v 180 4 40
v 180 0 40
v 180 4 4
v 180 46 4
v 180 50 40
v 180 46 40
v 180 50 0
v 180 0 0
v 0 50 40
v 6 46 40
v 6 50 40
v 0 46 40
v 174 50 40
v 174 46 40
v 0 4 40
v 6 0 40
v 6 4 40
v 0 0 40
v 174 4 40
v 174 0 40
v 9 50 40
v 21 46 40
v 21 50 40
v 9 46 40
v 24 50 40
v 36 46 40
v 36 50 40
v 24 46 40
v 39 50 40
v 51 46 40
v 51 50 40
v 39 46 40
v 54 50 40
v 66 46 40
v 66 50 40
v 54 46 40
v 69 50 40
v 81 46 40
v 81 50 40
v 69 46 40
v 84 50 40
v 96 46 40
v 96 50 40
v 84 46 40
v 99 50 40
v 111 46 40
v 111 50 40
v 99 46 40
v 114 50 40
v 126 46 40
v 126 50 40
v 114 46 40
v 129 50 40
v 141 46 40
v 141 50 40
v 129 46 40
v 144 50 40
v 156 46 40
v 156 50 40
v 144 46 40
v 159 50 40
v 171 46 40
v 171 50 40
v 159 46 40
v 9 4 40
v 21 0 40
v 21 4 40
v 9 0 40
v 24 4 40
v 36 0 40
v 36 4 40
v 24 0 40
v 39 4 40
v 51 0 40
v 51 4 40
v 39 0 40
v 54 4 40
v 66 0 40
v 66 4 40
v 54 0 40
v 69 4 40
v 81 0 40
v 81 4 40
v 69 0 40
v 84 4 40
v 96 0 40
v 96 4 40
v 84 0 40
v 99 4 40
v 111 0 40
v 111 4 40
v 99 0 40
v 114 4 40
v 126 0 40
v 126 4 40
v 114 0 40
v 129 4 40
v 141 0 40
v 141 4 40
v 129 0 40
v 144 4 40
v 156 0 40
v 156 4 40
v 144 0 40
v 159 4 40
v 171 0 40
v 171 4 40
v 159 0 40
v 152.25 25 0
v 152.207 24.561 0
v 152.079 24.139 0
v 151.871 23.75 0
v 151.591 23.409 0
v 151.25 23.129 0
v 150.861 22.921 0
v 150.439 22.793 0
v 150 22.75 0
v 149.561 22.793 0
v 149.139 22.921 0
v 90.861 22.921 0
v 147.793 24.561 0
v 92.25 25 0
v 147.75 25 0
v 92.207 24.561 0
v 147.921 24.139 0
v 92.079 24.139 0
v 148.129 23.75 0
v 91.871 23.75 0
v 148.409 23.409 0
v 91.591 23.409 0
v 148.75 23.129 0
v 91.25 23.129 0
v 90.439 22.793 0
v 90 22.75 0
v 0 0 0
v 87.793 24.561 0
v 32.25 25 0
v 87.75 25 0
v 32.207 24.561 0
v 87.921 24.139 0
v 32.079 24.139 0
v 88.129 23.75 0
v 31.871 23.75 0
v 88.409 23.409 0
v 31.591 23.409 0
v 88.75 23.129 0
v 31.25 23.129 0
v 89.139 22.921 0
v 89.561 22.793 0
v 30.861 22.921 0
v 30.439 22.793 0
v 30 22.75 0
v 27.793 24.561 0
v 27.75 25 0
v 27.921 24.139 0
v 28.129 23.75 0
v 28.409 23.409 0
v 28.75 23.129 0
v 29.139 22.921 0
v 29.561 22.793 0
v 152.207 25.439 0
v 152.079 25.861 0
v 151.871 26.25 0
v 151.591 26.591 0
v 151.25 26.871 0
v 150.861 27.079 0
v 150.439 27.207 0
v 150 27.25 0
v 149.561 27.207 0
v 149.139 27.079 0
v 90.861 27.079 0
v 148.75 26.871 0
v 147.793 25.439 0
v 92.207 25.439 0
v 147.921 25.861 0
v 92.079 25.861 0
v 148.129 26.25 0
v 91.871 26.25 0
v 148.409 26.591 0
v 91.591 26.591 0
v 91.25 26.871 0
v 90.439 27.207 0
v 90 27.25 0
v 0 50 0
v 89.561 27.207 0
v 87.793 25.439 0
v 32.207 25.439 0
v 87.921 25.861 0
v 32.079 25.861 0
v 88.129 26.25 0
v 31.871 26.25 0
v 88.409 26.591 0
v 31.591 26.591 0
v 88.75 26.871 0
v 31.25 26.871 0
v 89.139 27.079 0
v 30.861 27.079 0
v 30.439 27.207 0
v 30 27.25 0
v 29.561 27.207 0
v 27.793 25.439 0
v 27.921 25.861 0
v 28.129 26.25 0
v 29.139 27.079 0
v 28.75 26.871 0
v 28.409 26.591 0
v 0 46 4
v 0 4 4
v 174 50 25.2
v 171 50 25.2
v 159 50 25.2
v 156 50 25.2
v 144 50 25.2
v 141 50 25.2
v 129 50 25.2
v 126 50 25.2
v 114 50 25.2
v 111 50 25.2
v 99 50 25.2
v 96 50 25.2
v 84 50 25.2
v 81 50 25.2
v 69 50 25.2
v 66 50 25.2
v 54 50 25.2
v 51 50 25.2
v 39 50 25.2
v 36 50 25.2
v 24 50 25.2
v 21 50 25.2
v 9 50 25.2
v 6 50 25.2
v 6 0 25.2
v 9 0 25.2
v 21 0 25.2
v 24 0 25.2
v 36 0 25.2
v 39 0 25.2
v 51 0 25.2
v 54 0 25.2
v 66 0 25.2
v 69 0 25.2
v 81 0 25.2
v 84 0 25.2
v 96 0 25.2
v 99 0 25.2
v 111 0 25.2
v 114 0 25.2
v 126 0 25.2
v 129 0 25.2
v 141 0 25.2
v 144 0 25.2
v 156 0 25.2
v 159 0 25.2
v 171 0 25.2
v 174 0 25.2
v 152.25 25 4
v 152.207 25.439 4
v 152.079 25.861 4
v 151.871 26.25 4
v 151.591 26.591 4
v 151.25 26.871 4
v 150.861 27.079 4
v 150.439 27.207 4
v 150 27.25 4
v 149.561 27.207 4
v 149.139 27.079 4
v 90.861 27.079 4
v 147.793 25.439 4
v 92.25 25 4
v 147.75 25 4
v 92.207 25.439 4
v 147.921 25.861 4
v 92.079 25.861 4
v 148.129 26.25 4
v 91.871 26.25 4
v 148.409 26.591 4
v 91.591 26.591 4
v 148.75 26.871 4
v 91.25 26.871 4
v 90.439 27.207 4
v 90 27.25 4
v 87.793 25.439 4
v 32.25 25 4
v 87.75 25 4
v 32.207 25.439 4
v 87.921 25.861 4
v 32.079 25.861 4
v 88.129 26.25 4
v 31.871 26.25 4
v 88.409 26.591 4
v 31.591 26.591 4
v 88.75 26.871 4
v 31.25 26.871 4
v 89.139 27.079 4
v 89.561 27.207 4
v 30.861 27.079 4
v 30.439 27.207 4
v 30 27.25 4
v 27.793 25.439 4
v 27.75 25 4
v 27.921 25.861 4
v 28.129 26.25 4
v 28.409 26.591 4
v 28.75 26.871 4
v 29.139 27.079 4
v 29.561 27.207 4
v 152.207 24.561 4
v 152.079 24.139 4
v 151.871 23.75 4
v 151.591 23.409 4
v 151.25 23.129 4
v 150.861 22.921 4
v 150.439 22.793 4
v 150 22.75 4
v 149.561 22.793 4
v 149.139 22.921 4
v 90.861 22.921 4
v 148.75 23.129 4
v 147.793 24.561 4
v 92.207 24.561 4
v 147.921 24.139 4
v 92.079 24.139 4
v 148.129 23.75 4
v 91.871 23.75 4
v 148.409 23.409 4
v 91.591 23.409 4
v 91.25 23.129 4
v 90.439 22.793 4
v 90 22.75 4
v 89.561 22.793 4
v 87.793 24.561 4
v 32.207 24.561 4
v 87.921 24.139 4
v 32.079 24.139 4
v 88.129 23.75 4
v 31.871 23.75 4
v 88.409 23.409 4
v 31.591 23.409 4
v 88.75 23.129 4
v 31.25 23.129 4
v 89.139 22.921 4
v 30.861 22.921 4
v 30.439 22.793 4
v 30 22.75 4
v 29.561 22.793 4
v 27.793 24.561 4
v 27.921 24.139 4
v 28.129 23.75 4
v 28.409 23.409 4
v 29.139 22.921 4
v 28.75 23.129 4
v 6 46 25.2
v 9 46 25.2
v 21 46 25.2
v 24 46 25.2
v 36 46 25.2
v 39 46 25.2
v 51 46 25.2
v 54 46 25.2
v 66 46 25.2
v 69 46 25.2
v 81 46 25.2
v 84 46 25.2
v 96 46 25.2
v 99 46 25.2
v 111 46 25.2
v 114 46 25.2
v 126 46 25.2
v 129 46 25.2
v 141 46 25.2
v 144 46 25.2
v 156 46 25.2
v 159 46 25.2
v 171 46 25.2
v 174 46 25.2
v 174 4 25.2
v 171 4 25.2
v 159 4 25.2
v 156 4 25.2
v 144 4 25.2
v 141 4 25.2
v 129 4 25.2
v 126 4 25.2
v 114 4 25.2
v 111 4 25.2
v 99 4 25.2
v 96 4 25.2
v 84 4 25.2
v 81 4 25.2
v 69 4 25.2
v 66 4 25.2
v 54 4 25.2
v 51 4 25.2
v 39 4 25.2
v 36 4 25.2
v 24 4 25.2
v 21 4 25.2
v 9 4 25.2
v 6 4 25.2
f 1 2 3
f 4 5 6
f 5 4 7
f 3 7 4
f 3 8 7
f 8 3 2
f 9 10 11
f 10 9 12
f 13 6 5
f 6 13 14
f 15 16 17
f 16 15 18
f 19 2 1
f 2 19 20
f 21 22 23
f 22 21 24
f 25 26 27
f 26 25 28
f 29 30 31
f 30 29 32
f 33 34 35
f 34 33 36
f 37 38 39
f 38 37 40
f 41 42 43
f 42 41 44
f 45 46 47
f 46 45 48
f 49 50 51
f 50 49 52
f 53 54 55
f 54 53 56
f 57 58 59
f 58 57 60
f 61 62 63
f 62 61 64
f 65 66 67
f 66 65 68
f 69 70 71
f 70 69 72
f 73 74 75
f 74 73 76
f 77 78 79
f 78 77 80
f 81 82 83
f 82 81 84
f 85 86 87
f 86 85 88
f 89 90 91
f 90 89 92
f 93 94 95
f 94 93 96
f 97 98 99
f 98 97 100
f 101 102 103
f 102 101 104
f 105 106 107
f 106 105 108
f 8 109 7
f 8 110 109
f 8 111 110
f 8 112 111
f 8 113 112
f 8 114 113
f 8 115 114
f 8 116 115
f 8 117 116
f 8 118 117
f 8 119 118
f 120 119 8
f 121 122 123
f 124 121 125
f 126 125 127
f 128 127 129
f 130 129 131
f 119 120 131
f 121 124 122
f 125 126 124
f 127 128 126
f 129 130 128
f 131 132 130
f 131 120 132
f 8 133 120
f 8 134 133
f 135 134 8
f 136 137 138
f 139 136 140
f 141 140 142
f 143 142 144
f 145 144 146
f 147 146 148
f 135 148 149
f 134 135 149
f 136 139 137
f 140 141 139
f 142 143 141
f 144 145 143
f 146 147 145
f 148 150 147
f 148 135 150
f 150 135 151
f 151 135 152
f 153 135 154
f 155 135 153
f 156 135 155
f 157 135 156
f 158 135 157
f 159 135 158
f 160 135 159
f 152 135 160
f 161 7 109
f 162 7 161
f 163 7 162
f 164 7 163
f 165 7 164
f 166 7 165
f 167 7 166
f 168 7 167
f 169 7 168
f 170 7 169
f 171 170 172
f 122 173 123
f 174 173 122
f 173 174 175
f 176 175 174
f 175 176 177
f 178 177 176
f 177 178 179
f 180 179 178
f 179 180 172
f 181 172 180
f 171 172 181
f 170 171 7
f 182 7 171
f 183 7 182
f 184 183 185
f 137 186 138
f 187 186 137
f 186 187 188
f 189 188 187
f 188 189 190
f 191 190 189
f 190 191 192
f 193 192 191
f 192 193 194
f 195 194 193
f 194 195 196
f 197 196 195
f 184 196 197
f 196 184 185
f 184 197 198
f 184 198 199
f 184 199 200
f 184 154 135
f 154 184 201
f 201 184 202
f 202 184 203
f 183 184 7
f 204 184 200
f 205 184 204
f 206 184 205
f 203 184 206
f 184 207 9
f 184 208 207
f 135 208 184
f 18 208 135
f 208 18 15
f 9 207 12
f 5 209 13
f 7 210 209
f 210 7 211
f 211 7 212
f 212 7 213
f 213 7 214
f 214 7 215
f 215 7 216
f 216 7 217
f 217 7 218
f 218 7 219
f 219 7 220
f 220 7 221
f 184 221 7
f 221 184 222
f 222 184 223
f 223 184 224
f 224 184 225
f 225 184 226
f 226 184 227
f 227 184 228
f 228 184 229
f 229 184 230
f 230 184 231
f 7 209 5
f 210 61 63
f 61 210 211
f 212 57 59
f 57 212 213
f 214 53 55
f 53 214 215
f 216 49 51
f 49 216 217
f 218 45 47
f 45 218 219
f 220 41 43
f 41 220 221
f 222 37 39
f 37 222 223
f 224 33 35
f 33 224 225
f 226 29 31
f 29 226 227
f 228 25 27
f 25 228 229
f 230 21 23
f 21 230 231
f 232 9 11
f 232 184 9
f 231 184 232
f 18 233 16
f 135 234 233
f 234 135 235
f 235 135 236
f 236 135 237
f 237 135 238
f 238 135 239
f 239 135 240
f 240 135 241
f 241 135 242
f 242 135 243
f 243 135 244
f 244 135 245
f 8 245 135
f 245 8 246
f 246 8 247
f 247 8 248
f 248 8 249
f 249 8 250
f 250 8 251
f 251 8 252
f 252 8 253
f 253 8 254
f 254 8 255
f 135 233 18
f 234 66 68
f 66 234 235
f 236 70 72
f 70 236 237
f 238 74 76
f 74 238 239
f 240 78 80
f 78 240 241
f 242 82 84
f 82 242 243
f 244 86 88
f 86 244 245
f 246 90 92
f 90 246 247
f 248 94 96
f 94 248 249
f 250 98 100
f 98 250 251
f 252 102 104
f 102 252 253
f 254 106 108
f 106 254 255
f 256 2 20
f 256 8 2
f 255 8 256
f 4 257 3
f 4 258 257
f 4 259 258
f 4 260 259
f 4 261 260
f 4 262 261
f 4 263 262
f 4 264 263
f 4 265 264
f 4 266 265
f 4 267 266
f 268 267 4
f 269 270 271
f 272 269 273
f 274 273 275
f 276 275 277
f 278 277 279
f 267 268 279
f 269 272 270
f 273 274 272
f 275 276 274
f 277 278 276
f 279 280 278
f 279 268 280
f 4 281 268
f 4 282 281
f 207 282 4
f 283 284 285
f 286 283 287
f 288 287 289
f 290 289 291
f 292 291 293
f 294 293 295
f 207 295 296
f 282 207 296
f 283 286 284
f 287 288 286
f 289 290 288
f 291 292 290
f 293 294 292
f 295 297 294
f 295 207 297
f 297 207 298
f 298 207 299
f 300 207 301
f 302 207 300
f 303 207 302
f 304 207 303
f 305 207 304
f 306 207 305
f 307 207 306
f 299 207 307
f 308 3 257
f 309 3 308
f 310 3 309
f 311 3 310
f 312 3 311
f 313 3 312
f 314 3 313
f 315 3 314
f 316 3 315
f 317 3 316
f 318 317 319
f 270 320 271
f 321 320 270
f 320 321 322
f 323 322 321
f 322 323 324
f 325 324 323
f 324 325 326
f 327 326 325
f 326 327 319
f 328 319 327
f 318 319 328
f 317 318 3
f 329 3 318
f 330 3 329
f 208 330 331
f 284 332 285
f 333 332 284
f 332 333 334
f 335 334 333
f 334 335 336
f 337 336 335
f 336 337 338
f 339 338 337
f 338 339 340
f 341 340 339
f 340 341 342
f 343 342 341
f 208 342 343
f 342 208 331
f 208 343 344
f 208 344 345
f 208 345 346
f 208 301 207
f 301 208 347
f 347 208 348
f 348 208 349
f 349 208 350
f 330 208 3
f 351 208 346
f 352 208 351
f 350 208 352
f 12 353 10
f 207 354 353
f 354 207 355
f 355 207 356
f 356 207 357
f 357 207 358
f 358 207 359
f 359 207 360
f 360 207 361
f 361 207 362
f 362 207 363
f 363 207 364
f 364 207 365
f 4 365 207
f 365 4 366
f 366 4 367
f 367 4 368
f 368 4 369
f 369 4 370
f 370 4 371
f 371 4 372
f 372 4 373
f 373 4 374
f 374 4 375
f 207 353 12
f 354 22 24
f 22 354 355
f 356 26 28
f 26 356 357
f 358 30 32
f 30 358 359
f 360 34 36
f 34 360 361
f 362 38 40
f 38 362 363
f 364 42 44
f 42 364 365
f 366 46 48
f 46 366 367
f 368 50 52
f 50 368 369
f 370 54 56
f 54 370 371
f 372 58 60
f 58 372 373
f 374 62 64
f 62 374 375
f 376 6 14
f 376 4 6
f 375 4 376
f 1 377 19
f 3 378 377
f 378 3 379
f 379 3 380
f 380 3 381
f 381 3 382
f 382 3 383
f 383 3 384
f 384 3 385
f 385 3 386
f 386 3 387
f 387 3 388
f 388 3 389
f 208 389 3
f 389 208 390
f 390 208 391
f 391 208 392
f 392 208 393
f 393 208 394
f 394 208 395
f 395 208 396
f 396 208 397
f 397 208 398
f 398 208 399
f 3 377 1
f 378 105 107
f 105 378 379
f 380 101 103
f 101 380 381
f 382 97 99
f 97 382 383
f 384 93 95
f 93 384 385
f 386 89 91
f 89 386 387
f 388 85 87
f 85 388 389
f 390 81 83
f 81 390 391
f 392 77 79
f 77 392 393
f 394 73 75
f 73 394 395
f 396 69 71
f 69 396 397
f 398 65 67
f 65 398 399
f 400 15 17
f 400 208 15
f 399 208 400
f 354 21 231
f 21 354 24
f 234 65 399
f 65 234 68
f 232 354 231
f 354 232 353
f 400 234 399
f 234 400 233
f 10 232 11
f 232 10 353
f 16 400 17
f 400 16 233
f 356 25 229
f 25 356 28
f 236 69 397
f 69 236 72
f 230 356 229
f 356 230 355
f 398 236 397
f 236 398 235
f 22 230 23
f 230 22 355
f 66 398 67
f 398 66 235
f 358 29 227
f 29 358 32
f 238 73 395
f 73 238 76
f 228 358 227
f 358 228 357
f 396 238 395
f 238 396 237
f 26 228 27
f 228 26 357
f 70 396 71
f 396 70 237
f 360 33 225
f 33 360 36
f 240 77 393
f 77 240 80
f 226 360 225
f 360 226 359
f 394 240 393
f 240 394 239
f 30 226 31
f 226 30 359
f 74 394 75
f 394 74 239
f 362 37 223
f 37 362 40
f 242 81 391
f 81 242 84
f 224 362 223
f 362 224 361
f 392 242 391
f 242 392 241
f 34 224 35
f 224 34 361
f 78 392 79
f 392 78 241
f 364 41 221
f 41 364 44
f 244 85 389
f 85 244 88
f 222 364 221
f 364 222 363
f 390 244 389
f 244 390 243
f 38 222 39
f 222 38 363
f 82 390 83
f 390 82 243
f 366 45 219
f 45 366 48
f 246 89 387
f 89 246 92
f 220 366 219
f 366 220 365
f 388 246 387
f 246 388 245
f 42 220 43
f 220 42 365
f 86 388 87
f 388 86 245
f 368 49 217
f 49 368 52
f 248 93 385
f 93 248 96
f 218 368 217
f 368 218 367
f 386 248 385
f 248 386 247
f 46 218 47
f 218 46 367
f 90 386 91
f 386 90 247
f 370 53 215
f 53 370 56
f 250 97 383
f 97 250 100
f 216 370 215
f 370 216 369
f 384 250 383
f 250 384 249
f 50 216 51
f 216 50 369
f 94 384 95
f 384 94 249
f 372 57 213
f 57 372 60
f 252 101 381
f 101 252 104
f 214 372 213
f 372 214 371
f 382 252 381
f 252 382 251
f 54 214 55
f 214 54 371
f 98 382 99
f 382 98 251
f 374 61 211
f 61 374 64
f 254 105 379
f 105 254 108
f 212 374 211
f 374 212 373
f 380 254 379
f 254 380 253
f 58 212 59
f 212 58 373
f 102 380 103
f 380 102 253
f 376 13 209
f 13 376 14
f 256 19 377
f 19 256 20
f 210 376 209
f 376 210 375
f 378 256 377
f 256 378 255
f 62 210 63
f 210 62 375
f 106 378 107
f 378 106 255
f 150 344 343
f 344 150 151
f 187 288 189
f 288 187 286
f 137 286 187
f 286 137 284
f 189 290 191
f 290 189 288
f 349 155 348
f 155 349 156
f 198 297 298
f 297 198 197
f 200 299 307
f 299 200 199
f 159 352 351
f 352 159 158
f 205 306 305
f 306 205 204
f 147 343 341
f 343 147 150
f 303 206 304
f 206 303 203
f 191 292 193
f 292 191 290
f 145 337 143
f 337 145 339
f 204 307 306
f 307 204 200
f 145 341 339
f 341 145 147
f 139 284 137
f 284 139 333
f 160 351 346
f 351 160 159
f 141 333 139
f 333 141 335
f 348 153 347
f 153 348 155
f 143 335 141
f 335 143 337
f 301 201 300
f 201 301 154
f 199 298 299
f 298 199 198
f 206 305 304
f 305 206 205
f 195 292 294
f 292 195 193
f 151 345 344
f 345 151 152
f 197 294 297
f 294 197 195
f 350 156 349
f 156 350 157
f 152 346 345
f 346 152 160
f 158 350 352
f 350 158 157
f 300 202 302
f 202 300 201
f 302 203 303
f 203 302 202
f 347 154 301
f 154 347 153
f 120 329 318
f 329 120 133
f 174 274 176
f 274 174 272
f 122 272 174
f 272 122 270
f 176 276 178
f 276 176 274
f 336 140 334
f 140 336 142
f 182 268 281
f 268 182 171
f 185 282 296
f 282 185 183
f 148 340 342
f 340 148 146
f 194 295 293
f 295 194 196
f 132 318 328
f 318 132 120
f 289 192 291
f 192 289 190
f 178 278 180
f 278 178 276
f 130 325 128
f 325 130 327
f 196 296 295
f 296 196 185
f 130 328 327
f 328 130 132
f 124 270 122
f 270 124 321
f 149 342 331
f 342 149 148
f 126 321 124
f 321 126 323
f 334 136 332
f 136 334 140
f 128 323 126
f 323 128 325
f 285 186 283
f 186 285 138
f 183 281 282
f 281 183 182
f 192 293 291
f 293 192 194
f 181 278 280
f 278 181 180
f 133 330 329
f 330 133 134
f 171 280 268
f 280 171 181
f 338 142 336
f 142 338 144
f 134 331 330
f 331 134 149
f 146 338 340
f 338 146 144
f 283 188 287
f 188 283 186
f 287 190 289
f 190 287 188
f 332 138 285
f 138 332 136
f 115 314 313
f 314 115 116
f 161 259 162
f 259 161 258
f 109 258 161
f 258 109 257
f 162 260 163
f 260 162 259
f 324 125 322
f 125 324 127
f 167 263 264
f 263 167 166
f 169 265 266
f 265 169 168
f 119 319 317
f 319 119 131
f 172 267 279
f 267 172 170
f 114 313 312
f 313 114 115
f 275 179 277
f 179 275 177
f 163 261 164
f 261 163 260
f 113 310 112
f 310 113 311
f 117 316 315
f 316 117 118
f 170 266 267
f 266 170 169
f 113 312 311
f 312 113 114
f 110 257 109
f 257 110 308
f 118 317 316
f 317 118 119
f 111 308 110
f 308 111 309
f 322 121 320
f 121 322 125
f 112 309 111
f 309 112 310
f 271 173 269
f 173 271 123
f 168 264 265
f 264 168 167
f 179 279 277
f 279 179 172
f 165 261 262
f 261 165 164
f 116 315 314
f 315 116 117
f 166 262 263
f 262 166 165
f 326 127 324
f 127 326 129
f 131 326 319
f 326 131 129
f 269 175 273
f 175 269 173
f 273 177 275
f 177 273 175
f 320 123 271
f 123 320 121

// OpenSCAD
$fn = 32;

// ----------------------------------------------------------------------
// Cable duct: 180 x 50 x 40 mm, 12 fingers
// ----------------------------------------------------------------------

// --- parameters (mm) ---
channel_l = 180;          // duct length, X
channel_w = 50;           // duct width, Y
channel_h = 40;           // duct height, Z
channel_t = 4;            // side wall thickness
floor_t = 4;              // floor thickness
slot_w = 3;               // finger slot width
slot_h = 21.2;            // finger slot height
fingers = 12;             // number of finger slots per side
pitch = 15;               // finger pitch
hole_d = 4.5;             // floor mounting hole
hole_n = 3;               // mounting holes in the floor

module shell() {
  difference() {
    cube([channel_l, channel_w, channel_h]);
    /* open top channel */
    translate([-channel_t - 1, channel_t, floor_t])
      cube([channel_l + 2 * channel_t + 2, channel_w - 2 * channel_t, channel_h + 1]);
  }
}

difference() {
  union() {
    shell();
  }
  /* finger slots cut through both side walls */
  for (i = [0 : fingers - 1]) translate([pitch / 2 + i * pitch - slot_w / 2, -1, floor_t + slot_h]) cube([slot_w, channel_w + 2, channel_h]);
  for (i = [0 : hole_n - 1]) translate([(channel_l / hole_n) * (i + 0.5), channel_w / 2, -1]) cylinder(h = floor_t + 2, d = hole_d);
}
